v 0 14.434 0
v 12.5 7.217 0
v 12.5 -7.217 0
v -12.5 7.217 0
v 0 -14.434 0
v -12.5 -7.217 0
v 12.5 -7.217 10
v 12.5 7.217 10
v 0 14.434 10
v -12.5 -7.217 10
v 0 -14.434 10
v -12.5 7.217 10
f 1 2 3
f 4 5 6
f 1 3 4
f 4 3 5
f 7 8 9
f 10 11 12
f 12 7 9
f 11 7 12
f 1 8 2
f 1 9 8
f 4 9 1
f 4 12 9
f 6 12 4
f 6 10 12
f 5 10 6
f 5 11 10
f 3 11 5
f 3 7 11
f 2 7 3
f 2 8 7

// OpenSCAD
// Hive Pocket sized blank tile (for painting)

flat2flat = 25;
height = 10;

module regular_polygon(order, r=1){
    angles=[ for (i = [0:order-1]) i*(360/order) ];
    coords=[ for (th=angles) [r*cos(th), r*sin(th)] ];
    polygon(coords);
}
 
module hexagon(r, h) {
    linear_extrude(h)
    scale([r, r, 1])
    regular_polygon(6);
}


r = sqrt(flat2flat*flat2flat/3);

rotate([0, 0, 30])
hexagon(r, height);
